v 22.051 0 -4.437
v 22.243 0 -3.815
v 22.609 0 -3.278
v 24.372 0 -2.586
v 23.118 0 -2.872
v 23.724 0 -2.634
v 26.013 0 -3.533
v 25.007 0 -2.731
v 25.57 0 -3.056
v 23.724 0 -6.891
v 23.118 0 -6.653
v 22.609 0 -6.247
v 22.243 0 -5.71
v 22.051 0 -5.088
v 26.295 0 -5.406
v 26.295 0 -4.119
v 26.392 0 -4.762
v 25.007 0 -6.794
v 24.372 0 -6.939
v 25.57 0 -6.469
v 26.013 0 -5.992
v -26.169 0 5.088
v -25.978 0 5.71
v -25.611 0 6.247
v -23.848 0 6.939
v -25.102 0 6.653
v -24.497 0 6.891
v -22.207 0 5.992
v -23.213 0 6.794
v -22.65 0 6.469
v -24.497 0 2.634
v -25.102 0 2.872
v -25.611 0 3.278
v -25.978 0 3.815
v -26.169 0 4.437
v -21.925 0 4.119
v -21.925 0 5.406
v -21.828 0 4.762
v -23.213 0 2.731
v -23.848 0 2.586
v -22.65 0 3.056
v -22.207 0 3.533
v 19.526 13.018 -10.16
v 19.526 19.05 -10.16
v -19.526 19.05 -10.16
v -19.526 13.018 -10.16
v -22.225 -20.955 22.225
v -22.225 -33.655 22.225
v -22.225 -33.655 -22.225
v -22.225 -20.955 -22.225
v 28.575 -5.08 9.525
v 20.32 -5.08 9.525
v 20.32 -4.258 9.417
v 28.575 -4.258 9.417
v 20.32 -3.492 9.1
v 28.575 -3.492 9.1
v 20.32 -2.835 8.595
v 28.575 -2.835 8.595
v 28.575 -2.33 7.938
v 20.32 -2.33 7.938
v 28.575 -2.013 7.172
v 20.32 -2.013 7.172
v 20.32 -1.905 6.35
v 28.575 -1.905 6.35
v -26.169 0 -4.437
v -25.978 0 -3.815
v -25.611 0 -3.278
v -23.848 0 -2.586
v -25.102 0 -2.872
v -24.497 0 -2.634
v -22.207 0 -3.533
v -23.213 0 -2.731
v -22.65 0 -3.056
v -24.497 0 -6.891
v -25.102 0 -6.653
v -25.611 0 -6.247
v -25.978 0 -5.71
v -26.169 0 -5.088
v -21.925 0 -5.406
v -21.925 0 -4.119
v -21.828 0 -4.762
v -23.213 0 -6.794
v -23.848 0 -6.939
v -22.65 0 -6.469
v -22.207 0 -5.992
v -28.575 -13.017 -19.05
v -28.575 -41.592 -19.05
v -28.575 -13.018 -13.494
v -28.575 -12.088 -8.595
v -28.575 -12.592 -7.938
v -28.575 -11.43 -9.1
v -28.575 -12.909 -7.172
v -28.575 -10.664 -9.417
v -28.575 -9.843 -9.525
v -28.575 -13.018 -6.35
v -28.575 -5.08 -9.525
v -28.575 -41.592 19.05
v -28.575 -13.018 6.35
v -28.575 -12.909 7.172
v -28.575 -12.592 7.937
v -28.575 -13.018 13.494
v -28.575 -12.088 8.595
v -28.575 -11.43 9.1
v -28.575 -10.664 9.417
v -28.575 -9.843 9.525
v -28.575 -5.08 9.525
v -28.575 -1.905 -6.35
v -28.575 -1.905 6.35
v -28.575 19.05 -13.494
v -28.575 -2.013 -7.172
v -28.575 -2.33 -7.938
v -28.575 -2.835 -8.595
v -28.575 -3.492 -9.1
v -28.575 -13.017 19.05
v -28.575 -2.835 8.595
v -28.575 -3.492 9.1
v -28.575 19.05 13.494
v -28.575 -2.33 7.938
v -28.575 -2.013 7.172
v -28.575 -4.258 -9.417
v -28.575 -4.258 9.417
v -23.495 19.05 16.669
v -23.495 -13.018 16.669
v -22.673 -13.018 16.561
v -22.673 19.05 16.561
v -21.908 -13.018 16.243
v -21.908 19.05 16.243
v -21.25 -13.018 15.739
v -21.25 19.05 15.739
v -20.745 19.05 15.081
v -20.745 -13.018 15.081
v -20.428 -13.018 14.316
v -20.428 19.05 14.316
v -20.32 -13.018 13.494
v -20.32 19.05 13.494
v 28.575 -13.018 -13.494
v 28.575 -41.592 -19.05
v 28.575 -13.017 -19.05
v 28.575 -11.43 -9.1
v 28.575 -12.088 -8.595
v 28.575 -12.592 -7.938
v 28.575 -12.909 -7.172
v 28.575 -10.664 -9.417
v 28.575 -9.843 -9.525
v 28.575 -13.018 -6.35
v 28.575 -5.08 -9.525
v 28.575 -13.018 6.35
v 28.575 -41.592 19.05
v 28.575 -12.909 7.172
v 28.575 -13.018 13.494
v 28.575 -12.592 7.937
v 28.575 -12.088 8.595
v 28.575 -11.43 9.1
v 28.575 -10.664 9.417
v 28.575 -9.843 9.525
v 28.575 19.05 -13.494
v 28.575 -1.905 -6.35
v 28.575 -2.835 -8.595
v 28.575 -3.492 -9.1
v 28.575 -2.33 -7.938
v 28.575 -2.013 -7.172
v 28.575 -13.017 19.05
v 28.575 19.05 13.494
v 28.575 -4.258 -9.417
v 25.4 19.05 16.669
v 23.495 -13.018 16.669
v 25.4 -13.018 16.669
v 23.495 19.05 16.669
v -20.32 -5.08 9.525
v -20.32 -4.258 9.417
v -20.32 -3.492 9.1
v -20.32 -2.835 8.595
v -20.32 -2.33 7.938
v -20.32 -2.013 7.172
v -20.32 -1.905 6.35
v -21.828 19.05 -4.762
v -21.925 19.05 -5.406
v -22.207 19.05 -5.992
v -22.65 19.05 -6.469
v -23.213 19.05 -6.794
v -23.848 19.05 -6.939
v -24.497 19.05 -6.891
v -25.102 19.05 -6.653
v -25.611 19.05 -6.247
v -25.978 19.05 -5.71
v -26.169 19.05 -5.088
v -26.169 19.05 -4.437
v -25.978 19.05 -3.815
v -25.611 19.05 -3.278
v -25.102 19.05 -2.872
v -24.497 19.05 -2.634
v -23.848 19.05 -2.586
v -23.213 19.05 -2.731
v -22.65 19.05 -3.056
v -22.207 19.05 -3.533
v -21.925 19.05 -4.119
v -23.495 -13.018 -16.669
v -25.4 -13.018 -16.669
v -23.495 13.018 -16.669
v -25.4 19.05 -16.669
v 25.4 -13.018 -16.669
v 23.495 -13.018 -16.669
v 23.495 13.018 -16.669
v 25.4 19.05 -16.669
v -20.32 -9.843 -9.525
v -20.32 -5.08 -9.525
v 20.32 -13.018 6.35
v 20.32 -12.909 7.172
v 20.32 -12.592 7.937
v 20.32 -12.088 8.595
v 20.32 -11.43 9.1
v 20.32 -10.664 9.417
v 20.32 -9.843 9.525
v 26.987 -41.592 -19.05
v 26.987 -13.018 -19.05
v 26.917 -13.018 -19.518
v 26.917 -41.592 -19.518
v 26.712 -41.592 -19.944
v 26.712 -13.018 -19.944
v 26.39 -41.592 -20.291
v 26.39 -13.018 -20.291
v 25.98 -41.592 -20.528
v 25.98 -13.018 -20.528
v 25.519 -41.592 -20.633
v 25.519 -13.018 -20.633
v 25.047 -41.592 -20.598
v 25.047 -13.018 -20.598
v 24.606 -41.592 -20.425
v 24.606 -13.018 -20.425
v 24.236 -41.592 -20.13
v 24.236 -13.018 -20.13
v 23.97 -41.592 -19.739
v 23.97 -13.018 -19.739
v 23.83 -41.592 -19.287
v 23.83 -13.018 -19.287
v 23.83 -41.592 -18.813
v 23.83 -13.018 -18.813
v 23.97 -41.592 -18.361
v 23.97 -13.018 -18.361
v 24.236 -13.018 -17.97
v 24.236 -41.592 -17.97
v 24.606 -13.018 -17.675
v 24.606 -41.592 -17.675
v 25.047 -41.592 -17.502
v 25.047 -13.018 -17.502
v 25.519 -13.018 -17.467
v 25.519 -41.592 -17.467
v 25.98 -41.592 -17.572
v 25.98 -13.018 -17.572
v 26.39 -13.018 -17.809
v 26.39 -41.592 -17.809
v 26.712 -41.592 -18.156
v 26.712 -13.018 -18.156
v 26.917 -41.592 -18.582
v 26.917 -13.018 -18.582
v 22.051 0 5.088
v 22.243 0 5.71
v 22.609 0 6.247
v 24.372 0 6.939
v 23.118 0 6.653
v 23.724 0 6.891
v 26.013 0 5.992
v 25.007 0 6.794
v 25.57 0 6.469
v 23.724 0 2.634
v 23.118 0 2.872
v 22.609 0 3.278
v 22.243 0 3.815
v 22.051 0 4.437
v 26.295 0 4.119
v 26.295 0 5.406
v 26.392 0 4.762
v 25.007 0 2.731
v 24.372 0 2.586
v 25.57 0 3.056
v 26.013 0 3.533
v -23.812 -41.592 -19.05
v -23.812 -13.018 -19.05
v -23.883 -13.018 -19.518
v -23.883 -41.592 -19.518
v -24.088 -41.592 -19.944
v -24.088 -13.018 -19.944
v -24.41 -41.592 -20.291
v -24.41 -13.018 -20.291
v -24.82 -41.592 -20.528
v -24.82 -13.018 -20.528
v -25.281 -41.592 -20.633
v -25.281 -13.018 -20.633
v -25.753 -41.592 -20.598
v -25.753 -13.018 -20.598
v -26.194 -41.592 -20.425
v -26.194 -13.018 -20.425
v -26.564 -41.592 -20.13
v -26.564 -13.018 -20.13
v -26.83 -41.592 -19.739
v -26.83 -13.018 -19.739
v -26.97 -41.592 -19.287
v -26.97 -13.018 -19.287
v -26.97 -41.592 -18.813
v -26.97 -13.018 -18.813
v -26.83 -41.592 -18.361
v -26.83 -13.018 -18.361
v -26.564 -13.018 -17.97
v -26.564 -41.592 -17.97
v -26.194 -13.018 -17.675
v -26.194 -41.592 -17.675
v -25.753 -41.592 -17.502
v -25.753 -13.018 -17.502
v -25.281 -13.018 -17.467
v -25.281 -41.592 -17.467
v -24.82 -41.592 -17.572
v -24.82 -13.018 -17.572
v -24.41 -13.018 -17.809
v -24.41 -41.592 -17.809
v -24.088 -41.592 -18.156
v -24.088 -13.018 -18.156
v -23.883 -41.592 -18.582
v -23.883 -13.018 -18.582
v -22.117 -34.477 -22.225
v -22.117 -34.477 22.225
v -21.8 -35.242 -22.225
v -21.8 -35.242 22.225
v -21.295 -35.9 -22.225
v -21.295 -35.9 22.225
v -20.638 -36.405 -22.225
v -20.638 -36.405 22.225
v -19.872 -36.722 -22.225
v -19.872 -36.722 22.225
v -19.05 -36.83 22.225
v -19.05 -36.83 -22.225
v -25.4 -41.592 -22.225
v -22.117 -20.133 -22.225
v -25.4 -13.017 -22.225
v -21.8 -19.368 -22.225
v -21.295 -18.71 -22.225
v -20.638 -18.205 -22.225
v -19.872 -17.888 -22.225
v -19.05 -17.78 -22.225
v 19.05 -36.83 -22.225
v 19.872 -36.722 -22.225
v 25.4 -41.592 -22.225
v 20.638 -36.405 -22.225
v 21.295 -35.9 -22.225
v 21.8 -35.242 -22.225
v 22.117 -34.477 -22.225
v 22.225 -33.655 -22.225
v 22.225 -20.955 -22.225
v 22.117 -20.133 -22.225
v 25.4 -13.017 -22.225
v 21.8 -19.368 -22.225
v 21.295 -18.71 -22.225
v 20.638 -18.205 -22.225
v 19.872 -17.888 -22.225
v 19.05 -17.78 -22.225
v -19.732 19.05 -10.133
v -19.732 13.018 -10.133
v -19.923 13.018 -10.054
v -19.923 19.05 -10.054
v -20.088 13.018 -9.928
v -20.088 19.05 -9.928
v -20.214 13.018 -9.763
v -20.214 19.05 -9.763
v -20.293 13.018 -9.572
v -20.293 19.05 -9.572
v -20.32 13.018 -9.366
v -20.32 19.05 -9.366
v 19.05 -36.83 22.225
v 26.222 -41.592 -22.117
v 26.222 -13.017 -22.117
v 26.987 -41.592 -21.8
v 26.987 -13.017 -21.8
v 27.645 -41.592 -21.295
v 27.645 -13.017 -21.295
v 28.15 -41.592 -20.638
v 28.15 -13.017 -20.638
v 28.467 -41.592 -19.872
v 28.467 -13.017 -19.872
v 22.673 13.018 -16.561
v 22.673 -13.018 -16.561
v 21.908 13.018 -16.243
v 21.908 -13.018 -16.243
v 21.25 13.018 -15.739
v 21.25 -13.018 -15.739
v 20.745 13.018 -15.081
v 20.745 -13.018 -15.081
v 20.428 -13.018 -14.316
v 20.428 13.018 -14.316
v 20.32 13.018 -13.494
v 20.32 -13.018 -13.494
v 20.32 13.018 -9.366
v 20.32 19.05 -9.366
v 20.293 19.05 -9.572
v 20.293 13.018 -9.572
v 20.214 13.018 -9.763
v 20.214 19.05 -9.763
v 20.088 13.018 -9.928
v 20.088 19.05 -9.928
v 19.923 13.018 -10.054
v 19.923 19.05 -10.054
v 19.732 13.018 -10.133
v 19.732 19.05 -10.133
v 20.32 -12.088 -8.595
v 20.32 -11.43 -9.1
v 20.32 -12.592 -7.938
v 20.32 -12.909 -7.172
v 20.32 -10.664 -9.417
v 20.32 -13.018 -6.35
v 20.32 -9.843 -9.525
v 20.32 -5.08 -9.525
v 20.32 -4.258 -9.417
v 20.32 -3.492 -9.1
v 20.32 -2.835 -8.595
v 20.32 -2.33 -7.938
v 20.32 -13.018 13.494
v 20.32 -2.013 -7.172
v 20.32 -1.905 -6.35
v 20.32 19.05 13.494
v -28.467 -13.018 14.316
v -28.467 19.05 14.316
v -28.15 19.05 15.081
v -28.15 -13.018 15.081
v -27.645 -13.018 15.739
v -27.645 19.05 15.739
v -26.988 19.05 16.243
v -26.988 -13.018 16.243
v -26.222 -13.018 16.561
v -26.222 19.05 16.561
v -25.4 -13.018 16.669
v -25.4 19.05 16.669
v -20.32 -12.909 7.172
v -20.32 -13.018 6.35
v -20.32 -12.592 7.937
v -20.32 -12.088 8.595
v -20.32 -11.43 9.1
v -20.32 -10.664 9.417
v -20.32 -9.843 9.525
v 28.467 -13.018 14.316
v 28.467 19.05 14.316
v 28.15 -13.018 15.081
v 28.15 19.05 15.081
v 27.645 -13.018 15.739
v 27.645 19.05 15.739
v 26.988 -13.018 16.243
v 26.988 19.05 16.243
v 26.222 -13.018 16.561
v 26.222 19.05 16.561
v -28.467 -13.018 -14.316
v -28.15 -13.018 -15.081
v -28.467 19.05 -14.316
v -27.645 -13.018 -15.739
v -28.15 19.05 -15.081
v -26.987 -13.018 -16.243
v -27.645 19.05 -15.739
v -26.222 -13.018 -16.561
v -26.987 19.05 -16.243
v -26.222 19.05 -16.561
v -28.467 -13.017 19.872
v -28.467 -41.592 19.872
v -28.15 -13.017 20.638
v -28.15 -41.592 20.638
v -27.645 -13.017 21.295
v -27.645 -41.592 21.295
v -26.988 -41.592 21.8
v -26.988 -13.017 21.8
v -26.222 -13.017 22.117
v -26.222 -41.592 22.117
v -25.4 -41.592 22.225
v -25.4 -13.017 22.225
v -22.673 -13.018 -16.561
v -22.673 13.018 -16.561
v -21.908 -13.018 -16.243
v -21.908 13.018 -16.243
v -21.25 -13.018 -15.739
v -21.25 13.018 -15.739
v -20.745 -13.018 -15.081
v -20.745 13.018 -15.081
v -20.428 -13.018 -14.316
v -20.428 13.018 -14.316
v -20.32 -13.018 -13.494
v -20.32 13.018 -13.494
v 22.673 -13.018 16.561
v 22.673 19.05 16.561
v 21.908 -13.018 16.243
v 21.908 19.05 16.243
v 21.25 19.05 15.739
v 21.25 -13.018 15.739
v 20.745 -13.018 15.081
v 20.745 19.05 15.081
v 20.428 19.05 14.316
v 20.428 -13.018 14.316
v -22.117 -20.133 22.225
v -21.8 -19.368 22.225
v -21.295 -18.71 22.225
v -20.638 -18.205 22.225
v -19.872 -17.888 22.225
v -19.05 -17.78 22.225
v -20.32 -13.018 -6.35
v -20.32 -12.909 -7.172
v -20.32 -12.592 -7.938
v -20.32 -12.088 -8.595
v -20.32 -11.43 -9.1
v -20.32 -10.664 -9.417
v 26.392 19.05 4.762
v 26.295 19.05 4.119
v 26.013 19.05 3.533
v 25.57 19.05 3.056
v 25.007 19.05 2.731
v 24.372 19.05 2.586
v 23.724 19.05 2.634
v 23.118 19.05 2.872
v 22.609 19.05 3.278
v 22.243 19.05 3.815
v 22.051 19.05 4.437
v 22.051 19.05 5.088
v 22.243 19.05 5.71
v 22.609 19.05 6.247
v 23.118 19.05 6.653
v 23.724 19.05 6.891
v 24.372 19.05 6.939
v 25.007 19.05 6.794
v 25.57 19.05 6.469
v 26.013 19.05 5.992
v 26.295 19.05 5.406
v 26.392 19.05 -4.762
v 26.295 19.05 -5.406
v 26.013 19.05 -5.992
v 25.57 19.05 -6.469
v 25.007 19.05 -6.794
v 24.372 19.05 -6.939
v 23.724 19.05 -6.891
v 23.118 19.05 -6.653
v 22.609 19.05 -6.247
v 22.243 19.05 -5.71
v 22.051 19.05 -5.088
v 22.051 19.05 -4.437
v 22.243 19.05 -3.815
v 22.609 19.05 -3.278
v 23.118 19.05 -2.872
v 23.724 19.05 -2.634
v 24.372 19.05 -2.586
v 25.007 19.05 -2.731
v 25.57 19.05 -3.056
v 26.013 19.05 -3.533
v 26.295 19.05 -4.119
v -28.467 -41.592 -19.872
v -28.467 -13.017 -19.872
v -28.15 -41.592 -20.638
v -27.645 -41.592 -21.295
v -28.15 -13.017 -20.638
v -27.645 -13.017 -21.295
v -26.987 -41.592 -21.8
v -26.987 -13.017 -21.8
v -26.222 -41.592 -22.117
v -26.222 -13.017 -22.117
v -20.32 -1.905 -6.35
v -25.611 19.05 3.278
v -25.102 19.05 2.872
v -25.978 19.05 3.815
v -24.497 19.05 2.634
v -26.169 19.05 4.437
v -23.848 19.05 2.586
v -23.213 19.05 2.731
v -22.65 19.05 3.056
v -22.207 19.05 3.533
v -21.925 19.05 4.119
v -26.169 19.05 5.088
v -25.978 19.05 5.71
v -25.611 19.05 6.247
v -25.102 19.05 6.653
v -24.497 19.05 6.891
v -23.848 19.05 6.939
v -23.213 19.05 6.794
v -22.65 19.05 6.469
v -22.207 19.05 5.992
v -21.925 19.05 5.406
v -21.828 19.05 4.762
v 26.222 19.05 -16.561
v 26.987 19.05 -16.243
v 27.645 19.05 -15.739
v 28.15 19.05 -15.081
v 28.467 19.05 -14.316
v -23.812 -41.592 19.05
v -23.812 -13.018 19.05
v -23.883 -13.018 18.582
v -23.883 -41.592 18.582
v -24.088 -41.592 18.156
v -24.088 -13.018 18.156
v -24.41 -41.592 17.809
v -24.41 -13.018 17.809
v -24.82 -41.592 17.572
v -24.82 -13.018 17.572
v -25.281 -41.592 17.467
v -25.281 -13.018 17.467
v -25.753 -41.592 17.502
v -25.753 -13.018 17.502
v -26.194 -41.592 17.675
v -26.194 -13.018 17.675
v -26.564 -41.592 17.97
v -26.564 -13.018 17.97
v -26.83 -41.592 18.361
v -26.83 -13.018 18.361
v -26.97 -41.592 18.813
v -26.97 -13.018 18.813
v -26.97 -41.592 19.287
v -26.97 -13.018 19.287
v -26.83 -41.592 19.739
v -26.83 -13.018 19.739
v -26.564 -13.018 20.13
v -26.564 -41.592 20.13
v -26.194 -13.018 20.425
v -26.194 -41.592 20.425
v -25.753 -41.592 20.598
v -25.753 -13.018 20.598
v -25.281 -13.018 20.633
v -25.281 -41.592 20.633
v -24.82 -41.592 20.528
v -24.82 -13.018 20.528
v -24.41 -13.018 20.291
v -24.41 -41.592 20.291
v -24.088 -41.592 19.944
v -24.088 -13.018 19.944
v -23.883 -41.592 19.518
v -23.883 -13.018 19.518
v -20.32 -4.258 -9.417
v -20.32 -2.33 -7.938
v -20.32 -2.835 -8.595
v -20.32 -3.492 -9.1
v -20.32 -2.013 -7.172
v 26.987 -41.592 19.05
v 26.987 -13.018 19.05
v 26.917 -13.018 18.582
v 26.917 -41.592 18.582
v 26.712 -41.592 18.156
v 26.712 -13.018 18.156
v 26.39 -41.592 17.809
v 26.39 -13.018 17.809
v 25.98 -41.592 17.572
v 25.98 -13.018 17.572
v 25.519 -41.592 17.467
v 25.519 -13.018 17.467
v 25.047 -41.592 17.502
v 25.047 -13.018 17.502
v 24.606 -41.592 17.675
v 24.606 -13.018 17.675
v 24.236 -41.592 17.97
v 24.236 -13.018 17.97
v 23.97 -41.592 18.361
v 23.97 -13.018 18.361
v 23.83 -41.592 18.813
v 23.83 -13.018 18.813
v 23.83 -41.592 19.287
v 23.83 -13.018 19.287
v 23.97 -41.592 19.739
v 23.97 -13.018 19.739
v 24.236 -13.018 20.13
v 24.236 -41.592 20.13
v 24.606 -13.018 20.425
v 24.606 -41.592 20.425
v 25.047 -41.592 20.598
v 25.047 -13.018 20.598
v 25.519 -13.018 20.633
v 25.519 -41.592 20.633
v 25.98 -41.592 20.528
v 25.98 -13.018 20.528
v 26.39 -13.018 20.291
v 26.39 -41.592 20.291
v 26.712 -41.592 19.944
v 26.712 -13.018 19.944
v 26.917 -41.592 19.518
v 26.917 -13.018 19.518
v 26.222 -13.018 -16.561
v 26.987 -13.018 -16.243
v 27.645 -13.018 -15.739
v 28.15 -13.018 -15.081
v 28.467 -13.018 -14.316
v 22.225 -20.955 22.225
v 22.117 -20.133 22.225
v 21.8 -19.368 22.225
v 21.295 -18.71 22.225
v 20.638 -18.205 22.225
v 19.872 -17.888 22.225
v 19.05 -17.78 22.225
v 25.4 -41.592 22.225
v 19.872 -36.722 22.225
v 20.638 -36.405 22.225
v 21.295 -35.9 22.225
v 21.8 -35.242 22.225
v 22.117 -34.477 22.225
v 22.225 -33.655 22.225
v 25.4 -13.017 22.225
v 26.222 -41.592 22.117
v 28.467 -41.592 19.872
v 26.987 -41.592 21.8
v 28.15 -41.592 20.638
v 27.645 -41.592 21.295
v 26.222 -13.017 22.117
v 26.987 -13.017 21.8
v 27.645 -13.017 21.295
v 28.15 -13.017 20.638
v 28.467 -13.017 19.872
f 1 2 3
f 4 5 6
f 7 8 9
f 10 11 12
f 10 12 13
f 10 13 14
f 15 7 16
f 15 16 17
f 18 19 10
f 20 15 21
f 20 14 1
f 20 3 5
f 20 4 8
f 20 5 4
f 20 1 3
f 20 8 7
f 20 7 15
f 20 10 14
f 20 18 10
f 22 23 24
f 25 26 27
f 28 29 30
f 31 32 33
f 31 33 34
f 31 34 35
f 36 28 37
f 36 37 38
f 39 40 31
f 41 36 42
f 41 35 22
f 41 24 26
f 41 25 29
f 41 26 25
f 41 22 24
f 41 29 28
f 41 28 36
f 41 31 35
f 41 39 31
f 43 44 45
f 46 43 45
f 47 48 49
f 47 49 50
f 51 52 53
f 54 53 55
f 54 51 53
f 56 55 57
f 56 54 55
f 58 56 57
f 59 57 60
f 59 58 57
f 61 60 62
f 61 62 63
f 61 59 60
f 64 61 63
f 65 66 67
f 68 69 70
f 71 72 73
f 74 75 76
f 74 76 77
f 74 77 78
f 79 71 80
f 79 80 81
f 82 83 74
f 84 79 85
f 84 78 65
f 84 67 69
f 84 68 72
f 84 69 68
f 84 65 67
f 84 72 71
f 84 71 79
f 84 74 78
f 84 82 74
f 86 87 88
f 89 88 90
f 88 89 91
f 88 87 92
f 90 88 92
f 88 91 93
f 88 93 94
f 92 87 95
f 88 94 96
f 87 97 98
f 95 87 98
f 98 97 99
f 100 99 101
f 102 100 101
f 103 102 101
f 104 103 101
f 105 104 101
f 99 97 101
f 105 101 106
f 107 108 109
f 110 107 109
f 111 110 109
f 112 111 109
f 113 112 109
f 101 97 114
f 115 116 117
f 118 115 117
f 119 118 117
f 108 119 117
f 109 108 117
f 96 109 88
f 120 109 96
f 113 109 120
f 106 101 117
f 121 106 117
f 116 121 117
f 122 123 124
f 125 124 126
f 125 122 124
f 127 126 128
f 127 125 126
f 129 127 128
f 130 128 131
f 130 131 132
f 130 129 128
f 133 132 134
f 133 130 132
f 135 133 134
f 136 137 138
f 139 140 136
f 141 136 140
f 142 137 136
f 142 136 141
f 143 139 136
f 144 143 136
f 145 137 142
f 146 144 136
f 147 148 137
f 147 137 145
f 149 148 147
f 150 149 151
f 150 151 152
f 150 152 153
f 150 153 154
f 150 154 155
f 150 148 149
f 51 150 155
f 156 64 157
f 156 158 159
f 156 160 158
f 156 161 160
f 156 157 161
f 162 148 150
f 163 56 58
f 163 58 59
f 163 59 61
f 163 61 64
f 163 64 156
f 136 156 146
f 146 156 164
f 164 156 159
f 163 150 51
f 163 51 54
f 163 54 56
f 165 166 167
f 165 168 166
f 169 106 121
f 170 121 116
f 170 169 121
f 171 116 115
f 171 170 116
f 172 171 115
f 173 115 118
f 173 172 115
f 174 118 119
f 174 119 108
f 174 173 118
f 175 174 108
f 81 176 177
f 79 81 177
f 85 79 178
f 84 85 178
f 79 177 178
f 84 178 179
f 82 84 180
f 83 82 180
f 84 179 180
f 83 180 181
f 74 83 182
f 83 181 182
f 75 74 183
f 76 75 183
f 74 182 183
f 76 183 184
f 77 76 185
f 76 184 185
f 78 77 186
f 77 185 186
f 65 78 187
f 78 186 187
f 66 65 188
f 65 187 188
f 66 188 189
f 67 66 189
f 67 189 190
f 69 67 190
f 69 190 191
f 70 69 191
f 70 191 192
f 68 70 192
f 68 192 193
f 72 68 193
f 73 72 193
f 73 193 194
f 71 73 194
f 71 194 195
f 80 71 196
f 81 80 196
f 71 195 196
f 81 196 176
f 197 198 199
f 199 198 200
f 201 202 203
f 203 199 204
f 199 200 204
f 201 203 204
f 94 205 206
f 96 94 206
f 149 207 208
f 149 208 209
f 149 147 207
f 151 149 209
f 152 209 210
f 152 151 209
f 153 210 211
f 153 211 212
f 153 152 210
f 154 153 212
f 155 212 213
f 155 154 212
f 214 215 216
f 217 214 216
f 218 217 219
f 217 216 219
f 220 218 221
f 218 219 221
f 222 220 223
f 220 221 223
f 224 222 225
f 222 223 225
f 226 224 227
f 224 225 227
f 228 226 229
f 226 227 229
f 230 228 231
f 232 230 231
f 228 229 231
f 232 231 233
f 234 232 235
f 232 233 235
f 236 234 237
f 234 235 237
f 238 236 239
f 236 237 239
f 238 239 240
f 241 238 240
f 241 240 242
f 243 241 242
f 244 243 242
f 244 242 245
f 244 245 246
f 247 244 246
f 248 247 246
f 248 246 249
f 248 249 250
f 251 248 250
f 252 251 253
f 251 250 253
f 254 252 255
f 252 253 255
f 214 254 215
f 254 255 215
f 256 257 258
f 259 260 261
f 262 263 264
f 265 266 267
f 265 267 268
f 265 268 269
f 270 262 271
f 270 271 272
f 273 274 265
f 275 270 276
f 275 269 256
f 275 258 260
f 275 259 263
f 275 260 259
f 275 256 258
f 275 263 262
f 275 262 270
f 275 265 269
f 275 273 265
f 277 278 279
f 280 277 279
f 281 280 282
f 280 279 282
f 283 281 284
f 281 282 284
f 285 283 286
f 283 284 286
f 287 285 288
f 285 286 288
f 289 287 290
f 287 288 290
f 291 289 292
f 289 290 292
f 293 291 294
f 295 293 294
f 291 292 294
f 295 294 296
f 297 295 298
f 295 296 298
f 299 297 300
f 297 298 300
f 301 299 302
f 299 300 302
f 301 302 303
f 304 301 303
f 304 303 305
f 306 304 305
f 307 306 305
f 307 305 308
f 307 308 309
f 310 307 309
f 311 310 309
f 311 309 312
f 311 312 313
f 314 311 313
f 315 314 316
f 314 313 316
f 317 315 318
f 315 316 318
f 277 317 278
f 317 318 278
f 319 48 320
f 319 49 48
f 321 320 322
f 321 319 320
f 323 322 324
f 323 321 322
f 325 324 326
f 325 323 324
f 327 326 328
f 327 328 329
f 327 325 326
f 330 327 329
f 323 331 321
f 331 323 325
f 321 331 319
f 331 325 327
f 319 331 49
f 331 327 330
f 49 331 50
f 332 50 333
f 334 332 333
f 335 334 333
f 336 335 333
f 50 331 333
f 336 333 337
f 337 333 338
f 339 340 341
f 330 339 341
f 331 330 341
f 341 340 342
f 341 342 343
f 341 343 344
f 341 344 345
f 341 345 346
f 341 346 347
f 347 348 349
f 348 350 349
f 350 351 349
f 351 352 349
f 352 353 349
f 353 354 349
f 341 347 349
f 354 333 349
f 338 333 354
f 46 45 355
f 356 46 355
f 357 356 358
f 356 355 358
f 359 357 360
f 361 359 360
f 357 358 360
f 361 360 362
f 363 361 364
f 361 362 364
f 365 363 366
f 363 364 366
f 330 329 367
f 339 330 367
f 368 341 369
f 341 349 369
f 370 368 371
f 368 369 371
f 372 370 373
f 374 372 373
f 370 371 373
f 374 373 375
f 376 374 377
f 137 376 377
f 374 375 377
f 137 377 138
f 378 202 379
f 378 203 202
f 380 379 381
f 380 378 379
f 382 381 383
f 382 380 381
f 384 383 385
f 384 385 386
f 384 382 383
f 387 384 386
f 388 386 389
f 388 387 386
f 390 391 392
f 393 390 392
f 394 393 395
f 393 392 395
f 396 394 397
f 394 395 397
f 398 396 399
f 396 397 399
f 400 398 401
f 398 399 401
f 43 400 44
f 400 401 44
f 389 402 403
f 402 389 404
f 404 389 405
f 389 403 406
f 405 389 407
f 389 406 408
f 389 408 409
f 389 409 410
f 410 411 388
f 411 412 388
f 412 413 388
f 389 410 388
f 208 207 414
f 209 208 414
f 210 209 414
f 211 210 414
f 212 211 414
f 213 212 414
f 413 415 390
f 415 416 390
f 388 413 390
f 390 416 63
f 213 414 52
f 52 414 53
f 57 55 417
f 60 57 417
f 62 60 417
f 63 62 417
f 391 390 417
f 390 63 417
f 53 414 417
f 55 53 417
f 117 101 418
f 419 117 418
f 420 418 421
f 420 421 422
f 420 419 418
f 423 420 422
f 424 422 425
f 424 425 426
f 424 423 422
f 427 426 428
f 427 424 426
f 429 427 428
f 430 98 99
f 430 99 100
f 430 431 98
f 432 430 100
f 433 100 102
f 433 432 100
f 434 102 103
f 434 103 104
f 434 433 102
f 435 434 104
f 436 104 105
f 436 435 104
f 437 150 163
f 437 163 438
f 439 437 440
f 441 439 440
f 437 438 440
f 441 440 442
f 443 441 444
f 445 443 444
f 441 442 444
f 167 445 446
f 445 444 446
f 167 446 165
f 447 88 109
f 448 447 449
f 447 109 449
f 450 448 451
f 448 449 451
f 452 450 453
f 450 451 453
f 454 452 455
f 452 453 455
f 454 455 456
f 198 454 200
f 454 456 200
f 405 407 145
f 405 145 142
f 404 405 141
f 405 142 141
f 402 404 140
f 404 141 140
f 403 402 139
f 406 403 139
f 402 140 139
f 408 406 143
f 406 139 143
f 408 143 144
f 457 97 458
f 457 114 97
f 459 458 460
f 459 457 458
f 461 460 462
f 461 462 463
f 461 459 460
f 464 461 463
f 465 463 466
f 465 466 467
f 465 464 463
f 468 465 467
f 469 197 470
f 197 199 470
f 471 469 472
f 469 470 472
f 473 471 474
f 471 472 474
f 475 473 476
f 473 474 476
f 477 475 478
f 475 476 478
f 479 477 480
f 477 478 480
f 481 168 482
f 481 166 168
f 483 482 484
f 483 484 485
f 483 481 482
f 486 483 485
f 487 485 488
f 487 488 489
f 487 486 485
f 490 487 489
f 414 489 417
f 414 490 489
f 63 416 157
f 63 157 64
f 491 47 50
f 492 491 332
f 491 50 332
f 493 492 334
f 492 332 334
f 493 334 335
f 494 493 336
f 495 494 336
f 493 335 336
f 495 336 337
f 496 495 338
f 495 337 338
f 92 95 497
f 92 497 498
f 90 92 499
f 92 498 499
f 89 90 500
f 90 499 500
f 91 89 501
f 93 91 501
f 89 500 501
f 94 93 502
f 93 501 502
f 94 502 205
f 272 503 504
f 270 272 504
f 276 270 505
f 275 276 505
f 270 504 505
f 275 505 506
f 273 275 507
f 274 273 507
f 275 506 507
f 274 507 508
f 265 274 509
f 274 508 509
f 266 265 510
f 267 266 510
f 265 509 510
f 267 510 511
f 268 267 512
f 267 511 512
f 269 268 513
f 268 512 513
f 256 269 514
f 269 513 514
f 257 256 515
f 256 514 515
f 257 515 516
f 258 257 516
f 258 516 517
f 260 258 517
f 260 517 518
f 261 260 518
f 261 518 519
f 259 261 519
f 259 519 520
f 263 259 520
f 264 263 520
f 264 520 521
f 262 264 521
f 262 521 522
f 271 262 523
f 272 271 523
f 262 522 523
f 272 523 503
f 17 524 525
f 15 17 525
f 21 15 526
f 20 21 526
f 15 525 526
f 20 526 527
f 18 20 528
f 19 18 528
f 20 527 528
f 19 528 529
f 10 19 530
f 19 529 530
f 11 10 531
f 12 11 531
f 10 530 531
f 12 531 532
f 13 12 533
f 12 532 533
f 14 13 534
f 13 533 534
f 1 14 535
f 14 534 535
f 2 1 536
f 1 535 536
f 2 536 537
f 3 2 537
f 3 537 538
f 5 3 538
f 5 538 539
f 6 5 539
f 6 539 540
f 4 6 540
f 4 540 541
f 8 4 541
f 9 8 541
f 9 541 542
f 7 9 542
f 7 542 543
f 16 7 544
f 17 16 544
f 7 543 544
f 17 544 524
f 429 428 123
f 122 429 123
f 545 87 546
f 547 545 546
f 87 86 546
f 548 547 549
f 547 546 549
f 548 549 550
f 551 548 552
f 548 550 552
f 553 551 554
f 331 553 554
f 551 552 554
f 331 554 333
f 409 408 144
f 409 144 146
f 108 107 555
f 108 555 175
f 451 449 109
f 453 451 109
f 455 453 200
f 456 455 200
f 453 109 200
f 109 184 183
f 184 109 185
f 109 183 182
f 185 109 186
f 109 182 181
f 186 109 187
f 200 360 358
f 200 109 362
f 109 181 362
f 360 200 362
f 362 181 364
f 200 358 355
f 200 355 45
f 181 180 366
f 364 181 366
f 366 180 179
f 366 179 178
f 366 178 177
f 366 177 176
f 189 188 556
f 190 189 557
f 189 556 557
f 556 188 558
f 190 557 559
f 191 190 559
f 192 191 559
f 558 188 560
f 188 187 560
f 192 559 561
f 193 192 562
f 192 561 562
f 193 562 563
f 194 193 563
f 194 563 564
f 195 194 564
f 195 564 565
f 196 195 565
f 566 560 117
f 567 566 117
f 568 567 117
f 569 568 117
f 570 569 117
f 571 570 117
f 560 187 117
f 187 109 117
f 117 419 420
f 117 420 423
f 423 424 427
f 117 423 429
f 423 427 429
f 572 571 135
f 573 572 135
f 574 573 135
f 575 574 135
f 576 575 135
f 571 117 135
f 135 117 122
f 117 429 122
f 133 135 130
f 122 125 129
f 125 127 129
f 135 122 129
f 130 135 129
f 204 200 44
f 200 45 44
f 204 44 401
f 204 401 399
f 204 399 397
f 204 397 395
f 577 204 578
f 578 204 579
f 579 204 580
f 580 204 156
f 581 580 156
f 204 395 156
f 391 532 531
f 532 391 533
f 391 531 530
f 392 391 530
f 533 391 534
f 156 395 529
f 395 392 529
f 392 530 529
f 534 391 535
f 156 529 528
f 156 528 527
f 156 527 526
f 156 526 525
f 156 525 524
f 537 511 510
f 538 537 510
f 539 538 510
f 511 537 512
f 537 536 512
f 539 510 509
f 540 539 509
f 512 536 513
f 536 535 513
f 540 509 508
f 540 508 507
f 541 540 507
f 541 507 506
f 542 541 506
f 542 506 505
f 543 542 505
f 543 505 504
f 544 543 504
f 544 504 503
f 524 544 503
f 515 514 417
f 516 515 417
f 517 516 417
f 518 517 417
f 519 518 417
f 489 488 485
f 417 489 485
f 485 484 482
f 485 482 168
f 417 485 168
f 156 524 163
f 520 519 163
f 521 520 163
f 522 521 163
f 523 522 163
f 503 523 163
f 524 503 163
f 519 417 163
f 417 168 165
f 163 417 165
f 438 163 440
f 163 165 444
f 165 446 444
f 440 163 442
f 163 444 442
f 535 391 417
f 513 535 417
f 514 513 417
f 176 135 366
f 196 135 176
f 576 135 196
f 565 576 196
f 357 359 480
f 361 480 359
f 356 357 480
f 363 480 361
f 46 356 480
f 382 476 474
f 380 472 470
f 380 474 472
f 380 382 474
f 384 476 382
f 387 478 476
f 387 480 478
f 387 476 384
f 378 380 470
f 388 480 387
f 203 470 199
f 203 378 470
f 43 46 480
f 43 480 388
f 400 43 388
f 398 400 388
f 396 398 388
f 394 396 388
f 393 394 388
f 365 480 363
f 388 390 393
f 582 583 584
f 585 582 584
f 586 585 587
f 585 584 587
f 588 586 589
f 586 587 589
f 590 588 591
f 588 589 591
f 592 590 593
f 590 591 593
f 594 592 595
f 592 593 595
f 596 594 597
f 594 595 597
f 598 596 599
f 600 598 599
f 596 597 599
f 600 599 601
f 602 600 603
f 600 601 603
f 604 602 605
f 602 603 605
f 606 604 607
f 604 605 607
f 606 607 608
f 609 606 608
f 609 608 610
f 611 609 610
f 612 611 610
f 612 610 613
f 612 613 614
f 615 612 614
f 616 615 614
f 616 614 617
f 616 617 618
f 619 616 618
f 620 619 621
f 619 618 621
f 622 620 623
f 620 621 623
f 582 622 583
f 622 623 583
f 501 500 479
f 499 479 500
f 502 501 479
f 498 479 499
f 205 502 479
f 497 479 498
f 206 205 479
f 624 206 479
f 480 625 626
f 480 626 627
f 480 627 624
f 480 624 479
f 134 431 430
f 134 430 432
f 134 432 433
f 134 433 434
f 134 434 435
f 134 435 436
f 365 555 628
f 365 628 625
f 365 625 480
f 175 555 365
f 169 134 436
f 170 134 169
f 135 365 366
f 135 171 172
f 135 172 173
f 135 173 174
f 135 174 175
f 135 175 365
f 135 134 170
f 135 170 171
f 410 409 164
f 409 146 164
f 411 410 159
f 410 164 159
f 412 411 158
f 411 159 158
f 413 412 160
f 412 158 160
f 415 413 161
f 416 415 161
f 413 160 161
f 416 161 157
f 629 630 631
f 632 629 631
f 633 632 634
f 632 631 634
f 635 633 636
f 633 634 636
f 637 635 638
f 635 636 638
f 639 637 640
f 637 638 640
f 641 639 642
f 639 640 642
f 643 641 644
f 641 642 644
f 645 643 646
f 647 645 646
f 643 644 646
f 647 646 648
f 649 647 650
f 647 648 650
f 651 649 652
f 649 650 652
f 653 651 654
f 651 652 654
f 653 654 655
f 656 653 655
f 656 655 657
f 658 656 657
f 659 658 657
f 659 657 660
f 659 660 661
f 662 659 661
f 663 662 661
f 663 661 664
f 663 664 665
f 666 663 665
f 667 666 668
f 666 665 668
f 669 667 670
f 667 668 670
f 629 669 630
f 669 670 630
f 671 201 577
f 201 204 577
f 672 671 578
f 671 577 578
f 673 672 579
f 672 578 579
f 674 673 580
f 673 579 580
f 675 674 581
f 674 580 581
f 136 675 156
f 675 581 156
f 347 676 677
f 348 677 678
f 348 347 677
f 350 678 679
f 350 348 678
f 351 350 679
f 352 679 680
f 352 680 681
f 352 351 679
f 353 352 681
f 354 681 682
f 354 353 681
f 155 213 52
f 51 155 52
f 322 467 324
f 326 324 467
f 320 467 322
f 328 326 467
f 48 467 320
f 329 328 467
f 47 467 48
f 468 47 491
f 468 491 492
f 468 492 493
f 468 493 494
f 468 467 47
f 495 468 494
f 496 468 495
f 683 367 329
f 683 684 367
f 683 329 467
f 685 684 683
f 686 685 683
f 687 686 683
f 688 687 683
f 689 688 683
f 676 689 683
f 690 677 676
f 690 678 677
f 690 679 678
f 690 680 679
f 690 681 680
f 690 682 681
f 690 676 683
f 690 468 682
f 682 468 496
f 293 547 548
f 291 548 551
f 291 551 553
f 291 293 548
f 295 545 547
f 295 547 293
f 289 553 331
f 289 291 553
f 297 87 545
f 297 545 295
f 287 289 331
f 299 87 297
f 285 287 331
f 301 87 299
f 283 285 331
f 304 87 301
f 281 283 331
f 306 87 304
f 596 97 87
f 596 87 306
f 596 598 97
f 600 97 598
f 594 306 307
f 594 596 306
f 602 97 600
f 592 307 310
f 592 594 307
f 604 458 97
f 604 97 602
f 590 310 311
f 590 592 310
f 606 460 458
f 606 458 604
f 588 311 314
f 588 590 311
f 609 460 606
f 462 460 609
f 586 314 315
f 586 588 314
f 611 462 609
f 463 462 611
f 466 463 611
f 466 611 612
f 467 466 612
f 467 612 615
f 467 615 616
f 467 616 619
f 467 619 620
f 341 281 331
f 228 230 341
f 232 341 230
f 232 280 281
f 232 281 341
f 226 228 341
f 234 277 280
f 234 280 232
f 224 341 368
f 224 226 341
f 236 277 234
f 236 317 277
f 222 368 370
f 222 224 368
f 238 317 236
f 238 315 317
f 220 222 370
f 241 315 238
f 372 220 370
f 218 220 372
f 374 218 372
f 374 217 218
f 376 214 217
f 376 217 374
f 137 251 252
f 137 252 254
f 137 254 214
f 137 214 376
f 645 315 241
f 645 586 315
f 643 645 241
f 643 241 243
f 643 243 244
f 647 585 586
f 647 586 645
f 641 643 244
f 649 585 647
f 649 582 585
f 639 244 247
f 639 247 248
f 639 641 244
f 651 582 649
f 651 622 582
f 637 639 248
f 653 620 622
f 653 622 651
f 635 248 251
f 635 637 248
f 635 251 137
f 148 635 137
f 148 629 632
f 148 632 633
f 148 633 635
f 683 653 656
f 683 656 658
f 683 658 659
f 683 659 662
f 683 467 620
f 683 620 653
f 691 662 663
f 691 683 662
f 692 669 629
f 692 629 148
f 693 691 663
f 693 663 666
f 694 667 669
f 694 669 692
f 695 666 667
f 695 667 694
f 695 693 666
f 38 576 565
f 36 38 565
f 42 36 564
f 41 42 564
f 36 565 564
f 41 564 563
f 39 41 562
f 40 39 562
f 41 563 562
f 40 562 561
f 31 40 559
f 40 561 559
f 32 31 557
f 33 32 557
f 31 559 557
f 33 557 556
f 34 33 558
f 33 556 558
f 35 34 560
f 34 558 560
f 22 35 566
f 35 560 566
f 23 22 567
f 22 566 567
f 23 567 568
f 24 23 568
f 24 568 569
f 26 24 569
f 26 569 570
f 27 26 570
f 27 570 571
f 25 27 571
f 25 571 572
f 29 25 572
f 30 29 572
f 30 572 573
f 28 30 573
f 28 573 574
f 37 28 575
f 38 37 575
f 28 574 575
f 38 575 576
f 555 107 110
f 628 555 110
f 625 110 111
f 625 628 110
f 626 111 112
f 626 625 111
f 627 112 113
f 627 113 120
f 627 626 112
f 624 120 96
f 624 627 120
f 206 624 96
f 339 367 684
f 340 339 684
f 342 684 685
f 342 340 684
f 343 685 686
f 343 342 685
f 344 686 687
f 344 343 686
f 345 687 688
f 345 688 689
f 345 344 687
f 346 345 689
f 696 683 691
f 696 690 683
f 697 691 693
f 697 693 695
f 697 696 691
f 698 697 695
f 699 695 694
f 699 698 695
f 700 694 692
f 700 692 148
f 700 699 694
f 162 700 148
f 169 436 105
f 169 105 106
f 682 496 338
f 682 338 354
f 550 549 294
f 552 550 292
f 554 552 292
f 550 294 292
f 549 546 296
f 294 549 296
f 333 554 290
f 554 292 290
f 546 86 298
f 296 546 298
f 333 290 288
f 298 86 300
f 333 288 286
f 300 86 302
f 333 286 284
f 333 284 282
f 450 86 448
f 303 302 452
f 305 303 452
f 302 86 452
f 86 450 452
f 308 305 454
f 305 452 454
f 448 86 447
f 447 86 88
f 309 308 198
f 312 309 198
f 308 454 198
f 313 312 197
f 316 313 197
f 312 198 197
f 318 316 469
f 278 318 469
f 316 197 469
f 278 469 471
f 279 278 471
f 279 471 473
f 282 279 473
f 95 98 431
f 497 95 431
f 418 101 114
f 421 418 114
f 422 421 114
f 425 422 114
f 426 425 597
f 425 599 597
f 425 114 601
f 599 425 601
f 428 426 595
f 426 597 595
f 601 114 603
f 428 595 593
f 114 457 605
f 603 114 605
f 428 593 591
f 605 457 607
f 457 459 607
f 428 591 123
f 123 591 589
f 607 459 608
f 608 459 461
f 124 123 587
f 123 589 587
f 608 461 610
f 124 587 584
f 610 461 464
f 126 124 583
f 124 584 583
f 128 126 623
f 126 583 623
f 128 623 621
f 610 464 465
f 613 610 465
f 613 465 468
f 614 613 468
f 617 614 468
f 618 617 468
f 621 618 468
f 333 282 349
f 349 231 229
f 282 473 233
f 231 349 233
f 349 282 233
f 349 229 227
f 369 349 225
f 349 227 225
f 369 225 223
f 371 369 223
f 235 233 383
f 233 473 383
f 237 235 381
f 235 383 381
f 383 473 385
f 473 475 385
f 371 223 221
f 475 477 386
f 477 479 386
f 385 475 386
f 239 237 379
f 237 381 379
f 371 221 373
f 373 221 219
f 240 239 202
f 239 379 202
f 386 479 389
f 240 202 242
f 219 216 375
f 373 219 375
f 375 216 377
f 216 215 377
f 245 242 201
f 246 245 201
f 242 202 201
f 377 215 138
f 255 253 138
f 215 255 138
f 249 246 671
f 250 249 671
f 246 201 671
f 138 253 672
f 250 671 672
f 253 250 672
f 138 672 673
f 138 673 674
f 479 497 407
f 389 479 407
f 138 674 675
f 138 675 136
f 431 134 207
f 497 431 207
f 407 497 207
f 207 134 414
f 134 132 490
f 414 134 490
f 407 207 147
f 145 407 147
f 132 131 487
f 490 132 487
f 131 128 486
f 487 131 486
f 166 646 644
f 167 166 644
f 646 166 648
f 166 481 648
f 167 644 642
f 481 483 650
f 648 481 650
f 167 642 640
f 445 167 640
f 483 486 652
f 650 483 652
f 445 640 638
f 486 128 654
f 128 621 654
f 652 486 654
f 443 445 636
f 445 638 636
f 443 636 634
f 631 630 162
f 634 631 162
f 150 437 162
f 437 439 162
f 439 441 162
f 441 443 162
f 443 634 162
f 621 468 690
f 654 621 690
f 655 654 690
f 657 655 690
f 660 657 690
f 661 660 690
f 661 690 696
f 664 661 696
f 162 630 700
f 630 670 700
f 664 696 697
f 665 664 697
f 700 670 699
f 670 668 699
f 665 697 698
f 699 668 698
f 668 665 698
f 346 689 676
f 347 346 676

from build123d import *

# Parameters (mm, degrees)
SKETCH1_W           = 57.15
SKETCH1_H           = 38.1
SKETCH1_W_2         = 40.64
SKETCH1_H_2         = 26.035
BOSS_EXTRUDE1_DEPTH = 16.66875
CUT_EXTRUDE1_DEPTH  = 30.95625
SKETCH5_W           = 19.05
SKETCH5_H           = 11.1125
CUT_EXTRUDE2_DEPTH  = 57.15
SKETCH6_R           = 2.1828125
CUT_EXTRUDE3_DEPTH  = 19.05
SKETCH9_W           = 57.15
SKETCH9_H           = 28.575
BOSS_EXTRUDE2_DEPTH = 22.225
SKETCH10_R          = 1.5875
CUT_EXTRUDE4_DEPTH  = 28.575
CUT_EXTRUDE6_REACH  = 46.45
SKETCH12_W          = 44.45
SKETCH12_H          = 19.05
FILLET1_R           = 3.175


with BuildPart() as part:
    # Sketch1 → Boss-Extrude1 (new body, symmetric)
    with BuildSketch(Plane.XY):
        Rectangle(SKETCH1_W, SKETCH1_H)
        Rectangle(SKETCH1_W_2, SKETCH1_H_2, mode=Mode.SUBTRACT)
    extrude(amount=BOSS_EXTRUDE1_DEPTH, both=True)

    # Sketch3 → Cut-Extrude1 (cut)
    with BuildSketch(Plane(origin=(0, 19.05, 0), x_dir=(1, 0, 0), z_dir=(0, 1, 0))):
        with BuildLine():
            Line((20.32, -10.16), (20.32, 9.36625))
            ThreePointArc((20.32, 9.36625), (20.087516008, 9.927516008), (19.52625, 10.16))
            Line((19.52625, 10.16), (-19.52625, 10.16))
            ThreePointArc((-19.52625, 10.16), (-20.087516008, 9.927516008), (-20.32, 9.36625))
            Line((-20.32, 9.36625), (-20.32, -10.16))
            Line((-20.32, -10.16), (-20.32, -16.66875))
            Line((-20.32, -16.66875), (20.32, -16.66875))
            Line((20.32, -16.66875), (20.32, -10.16))
        make_face()
    extrude(amount=-CUT_EXTRUDE1_DEPTH, mode=Mode.SUBTRACT)

    # Sketch5 → Cut-Extrude2 (cut)
    with BuildSketch(Plane.ZY.offset(28.575)):
        with Locations((0, -7.46125)):
            Rectangle(SKETCH5_W, SKETCH5_H)
    extrude(amount=-CUT_EXTRUDE2_DEPTH, mode=Mode.SUBTRACT)

    # Sketch6 → Cut-Extrude3 (cut)
    with BuildSketch(Plane(origin=(0, 19.05, 0), x_dir=(1, 0, 0), z_dir=(0, 1, 0))):
        with Locations((-24.0109375, -4.7625)):
            Circle(SKETCH6_R)
        with Locations((-24.0109375, 4.7625)):
            Circle(SKETCH6_R)
        with Locations((24.209375, -4.7625)):
            Circle(SKETCH6_R)
        with Locations((24.209375, 4.7625)):
            Circle(SKETCH6_R)
    extrude(amount=-CUT_EXTRUDE3_DEPTH, mode=Mode.SUBTRACT)

    # Sketch9 → Boss-Extrude2 (add, symmetric)
    with BuildSketch(Plane.XY):
        with Locations((0, -27.305)):
            Rectangle(SKETCH9_W, SKETCH9_H)
    extrude(amount=BOSS_EXTRUDE2_DEPTH, both=True)

    # Sketch10 → Cut-Extrude4 (cut)
    with BuildSketch(Plane(origin=(0, -13.0175, 0), x_dir=(1, 0, 0), z_dir=(0, 1, 0))):
        with Locations((-25.4, 19.05)):
            Circle(SKETCH10_R)
        with Locations((25.4, 19.05)):
            Circle(SKETCH10_R)
        with Locations((-25.4, -19.05)):
            Circle(SKETCH10_R)
        with Locations((25.4, -19.05)):
            Circle(SKETCH10_R)
    extrude(amount=-CUT_EXTRUDE4_DEPTH, mode=Mode.SUBTRACT)

    # Sketch12 → Cut-Extrude6 (cut, up to next)
    with BuildSketch(Plane.XY.offset(22.225), mode=Mode.PRIVATE) as cut_extrude6_sk1:
        with Locations((0, -27.305)):
            Rectangle(SKETCH12_W, SKETCH12_H)
    cut_extrude6_tool1 = extrude(cut_extrude6_sk1.sketch, amount=-CUT_EXTRUDE6_REACH, mode=Mode.PRIVATE) & part.part
    add(cut_extrude6_tool1.solids().sort_by_distance((0, -27.305, 22.225))[0], mode=Mode.SUBTRACT)

    # Fillet1
    fillet1_edges = [part.edges().sort_by_distance(p)[0] for p in [
        (28.575, 3.01625, -16.66875),
        (28.575, 3.01625, 16.66875),
        (-28.575, -27.305, -22.225),
        (28.575, -27.305, -22.225),
        (-28.575, -27.305, 22.225),
        (28.575, -27.305, 22.225),
        (20.32, 0, -16.66875),
        (-22.225, -36.83, 0),
        (-22.225, -17.78, 0),
        (22.225, -17.78, 0),
        (22.225, -36.83, 0),
        (-20.32, 0, -16.66875),
        (20.32, 3.01625, 16.66875),
        (-20.32, 3.01625, 16.66875),
        (-28.575, 3.01625, 16.66875),
        (-28.575, 3.01625, -16.66875),
        (24.4475, -13.0175, 9.525),
        (24.4475, -1.905, -9.525),
        (24.4475, -1.905, 9.525),
        (24.4475, -13.0175, -9.525),
        (-24.4475, -1.905, 9.525),
        (-24.4475, -13.0175, 9.525),
        (-24.4475, -13.0175, -9.525),
        (-24.4475, -1.905, -9.525),
    ]]
    fillet(fillet1_edges, radius=FILLET1_R)


solid = part.part
